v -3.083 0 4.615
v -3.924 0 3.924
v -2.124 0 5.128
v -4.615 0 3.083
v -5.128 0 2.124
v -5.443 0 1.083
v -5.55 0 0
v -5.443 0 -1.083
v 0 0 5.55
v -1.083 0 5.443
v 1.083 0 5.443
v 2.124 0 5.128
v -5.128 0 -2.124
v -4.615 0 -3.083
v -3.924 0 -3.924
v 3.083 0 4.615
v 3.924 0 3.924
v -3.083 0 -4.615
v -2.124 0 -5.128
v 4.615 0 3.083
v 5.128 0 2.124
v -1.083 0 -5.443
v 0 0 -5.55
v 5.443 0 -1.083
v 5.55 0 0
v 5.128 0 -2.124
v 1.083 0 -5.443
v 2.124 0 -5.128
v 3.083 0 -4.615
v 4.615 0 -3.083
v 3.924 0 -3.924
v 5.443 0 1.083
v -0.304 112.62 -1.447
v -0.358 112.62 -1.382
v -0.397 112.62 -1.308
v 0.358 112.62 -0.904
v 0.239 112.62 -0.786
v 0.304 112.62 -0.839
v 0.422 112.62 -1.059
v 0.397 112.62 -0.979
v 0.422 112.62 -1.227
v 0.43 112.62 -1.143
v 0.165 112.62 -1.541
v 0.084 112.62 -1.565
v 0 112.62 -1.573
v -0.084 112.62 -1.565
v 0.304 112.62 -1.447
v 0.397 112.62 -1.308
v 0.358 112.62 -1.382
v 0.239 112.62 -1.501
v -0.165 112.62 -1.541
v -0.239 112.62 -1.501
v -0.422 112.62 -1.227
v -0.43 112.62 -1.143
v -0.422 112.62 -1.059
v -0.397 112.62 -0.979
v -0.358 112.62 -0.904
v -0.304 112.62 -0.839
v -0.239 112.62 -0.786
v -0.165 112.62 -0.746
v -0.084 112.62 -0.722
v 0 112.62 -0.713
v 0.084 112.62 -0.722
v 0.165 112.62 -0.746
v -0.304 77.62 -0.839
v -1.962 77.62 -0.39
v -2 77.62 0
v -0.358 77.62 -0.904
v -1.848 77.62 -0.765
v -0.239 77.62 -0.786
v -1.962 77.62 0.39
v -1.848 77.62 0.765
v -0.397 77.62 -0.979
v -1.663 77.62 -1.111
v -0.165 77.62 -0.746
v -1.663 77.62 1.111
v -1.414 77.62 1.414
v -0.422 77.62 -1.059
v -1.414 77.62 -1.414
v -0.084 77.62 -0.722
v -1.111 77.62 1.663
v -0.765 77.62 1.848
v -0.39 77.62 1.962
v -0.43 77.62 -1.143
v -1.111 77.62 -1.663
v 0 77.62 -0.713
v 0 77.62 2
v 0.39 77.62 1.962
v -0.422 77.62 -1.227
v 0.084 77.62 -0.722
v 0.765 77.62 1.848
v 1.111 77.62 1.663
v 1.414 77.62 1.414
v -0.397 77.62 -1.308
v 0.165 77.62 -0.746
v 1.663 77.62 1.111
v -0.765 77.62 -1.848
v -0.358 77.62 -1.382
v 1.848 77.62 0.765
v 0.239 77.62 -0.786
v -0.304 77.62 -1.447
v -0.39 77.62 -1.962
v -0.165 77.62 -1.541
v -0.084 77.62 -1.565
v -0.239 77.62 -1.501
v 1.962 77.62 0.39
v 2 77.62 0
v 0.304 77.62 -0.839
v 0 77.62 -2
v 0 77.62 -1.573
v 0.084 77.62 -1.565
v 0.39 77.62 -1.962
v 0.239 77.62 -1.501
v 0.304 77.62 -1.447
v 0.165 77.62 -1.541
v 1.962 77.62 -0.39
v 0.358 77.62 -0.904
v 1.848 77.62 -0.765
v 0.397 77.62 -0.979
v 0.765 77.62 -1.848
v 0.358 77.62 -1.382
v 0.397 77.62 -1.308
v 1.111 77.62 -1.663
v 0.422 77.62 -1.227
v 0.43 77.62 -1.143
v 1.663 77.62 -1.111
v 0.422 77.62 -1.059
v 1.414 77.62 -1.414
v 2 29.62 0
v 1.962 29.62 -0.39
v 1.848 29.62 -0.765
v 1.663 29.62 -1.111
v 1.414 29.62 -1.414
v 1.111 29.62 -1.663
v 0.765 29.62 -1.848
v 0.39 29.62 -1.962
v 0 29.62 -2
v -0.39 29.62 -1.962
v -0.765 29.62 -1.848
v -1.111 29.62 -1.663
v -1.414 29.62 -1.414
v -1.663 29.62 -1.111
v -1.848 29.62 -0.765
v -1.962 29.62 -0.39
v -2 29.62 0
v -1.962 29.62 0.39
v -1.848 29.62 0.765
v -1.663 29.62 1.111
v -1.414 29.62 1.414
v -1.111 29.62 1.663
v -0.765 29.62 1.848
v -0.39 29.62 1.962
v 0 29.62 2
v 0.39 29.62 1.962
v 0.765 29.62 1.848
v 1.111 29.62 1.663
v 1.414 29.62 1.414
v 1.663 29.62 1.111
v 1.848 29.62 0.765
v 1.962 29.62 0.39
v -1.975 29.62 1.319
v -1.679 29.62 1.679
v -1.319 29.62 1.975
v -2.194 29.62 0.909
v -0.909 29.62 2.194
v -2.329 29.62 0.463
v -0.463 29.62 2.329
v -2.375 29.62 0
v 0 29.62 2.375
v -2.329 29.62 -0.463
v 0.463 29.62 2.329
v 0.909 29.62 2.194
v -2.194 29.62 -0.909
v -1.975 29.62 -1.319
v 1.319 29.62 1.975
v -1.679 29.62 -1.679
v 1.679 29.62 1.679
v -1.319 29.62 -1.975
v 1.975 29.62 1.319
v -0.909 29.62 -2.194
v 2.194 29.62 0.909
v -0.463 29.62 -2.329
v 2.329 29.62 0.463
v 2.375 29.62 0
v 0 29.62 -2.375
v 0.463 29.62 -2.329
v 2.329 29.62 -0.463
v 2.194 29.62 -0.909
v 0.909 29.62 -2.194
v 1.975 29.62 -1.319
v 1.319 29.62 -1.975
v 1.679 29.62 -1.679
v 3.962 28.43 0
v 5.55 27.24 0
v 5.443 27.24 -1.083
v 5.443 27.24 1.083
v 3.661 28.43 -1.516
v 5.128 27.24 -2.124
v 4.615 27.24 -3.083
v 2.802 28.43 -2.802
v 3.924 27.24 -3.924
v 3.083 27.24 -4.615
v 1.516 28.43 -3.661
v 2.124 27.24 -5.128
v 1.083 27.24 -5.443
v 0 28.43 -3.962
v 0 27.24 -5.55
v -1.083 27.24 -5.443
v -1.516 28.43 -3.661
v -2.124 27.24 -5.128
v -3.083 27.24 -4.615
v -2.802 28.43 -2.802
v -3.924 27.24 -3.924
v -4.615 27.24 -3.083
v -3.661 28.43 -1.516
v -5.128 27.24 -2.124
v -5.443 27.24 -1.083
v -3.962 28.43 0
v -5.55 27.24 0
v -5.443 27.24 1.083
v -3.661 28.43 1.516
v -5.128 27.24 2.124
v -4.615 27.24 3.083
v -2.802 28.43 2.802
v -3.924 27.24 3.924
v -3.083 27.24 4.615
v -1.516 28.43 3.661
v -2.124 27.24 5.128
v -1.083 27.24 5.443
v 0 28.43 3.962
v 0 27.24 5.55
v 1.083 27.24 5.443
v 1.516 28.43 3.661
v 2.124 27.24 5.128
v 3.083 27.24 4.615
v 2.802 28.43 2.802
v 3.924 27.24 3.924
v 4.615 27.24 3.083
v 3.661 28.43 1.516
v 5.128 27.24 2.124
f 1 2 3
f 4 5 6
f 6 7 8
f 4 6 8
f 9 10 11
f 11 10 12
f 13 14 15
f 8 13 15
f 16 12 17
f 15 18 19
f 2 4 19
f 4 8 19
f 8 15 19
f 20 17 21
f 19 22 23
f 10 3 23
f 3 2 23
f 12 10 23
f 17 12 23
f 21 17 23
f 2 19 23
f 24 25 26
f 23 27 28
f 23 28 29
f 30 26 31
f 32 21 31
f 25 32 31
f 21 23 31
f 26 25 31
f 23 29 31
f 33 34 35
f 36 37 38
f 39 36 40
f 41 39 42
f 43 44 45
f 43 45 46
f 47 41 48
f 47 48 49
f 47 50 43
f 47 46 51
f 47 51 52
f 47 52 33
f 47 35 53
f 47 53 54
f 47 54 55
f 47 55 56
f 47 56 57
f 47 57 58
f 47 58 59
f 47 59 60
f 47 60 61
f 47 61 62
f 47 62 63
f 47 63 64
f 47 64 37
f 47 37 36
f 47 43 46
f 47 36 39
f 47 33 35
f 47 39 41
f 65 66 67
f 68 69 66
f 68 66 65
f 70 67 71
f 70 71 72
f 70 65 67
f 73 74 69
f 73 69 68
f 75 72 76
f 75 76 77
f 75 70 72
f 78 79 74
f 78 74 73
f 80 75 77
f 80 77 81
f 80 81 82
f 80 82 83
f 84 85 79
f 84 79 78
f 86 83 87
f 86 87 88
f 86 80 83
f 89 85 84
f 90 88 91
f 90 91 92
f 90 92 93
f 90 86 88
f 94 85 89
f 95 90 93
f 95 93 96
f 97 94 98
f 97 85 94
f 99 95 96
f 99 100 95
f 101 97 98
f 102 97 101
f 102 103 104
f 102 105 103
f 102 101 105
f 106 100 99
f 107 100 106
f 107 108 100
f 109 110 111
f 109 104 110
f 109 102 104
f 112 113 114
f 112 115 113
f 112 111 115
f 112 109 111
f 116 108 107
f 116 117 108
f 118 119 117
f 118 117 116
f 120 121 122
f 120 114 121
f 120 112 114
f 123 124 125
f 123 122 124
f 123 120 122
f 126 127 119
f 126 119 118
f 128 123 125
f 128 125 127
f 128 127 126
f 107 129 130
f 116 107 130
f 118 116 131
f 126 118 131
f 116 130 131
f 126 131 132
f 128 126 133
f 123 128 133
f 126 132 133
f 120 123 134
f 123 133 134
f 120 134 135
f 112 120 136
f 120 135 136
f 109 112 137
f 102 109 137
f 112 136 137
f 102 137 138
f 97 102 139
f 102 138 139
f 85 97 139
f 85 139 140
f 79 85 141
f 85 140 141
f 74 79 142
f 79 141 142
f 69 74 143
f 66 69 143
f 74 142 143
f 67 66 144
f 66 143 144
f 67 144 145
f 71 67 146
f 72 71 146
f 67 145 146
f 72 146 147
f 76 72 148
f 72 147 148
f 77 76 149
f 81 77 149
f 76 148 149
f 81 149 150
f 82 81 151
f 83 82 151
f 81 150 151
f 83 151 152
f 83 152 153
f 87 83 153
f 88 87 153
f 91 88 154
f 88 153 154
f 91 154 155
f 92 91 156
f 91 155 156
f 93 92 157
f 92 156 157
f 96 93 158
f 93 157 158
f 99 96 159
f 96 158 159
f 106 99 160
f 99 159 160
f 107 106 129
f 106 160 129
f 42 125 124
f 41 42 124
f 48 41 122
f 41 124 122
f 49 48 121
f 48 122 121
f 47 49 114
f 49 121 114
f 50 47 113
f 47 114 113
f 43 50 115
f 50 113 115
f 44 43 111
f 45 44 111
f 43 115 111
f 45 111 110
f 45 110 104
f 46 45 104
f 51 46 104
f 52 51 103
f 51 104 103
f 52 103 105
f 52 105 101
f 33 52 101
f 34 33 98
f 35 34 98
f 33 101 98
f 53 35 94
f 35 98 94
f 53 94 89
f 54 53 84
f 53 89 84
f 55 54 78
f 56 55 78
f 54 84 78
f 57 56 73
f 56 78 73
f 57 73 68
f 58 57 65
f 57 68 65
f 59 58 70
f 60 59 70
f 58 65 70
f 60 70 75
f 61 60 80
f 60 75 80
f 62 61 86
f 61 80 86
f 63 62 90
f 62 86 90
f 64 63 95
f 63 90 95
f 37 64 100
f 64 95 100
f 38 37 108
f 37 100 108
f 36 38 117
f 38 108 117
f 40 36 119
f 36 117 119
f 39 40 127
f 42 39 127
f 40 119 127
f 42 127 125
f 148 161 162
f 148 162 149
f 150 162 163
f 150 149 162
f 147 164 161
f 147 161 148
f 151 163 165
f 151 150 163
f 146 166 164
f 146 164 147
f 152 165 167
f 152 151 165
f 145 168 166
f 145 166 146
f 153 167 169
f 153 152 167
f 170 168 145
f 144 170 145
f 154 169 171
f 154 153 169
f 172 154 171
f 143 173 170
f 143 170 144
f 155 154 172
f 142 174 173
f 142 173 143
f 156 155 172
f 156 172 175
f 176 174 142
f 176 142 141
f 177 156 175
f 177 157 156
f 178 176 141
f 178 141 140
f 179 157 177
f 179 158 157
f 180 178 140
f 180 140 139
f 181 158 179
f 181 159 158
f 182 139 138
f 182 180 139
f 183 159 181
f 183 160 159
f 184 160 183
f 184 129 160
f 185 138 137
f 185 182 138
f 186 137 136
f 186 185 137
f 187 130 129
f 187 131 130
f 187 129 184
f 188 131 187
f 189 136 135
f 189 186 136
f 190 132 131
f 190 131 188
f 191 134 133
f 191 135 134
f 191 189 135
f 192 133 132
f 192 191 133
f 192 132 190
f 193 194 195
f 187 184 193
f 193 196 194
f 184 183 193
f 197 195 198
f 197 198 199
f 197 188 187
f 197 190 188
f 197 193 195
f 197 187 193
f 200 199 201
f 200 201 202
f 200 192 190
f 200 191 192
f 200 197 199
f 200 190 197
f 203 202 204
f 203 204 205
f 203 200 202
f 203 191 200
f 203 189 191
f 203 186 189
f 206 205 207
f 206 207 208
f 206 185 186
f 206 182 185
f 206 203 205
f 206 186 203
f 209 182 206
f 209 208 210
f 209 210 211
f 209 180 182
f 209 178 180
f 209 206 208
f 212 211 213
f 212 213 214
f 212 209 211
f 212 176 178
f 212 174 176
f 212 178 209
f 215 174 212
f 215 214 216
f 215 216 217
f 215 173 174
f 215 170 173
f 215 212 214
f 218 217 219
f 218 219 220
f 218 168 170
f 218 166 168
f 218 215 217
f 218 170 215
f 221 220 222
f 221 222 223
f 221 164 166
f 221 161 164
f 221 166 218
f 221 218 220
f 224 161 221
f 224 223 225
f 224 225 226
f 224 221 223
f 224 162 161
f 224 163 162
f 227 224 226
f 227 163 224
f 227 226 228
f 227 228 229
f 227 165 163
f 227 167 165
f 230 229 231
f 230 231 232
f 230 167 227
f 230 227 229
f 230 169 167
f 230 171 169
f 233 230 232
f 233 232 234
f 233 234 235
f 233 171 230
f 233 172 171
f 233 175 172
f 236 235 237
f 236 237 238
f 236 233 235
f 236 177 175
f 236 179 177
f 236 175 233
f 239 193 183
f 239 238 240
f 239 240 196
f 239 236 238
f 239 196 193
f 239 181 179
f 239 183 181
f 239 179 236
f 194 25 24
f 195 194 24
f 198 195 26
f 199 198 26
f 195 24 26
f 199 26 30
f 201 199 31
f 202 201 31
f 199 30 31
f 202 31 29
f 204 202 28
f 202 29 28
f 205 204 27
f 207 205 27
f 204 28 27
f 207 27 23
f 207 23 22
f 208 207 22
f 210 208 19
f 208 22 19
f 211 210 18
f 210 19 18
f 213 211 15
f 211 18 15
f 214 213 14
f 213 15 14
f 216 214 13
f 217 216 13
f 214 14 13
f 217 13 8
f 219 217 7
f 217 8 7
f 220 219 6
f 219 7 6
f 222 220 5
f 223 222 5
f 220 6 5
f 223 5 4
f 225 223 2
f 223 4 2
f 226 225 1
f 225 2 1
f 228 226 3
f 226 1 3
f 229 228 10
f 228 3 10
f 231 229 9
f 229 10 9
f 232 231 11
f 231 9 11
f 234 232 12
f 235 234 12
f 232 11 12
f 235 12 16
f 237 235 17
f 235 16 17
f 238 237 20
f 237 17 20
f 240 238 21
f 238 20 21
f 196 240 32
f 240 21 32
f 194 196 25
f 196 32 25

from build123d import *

# Parameters (mm, degrees)
SKETCH1_R           = 5.55
BOSS_EXTRUDE1_DEPTH = 29.62
CHAMFER1_SIZE       = 2.38
CHAMFER1_SIZE2      = 3.175
SKETCH2_R           = 2
BOSS_EXTRUDE2_DEPTH = 48
SKETCH3_R           = 0.43
BOSS_EXTRUDE3_DEPTH = 35


with BuildPart() as part:
    # Sketch1 → Boss-Extrude1 (new body)
    with BuildSketch(Plane(origin=(0, 0, 0), x_dir=(1, 0, 0), z_dir=(0, 1, 0))):
        Circle(SKETCH1_R)
    extrude(amount=BOSS_EXTRUDE1_DEPTH)

    # Chamfer1
    chamfer1_edges = [part.edges().sort_by_distance(p)[0] for p in [
        (-5.55, 29.62, 0),
    ]]
    chamfer1_side = [part.faces().sort_by_distance(p)[0] for p in [
        (-5.55, 14.81, 0),
    ]]
    chamfer(chamfer1_edges, length=CHAMFER1_SIZE, length2=CHAMFER1_SIZE2, reference=chamfer1_side[0])

    # Sketch2 → Boss-Extrude2 (add)
    with BuildSketch(Plane(origin=(0, 29.62, 0), x_dir=(1, 0, 0), z_dir=(0, 1, 0))):
        Circle(SKETCH2_R)
    extrude(amount=BOSS_EXTRUDE2_DEPTH)

    # Sketch3 → Boss-Extrude3 (add)
    with BuildSketch(Plane(origin=(0, 77.62, 0), x_dir=(1, 0, 0), z_dir=(0, 1, 0))):
        with Locations((0, 1.143312096)):
            Circle(SKETCH3_R)
    extrude(amount=BOSS_EXTRUDE3_DEPTH)


solid = part.part
